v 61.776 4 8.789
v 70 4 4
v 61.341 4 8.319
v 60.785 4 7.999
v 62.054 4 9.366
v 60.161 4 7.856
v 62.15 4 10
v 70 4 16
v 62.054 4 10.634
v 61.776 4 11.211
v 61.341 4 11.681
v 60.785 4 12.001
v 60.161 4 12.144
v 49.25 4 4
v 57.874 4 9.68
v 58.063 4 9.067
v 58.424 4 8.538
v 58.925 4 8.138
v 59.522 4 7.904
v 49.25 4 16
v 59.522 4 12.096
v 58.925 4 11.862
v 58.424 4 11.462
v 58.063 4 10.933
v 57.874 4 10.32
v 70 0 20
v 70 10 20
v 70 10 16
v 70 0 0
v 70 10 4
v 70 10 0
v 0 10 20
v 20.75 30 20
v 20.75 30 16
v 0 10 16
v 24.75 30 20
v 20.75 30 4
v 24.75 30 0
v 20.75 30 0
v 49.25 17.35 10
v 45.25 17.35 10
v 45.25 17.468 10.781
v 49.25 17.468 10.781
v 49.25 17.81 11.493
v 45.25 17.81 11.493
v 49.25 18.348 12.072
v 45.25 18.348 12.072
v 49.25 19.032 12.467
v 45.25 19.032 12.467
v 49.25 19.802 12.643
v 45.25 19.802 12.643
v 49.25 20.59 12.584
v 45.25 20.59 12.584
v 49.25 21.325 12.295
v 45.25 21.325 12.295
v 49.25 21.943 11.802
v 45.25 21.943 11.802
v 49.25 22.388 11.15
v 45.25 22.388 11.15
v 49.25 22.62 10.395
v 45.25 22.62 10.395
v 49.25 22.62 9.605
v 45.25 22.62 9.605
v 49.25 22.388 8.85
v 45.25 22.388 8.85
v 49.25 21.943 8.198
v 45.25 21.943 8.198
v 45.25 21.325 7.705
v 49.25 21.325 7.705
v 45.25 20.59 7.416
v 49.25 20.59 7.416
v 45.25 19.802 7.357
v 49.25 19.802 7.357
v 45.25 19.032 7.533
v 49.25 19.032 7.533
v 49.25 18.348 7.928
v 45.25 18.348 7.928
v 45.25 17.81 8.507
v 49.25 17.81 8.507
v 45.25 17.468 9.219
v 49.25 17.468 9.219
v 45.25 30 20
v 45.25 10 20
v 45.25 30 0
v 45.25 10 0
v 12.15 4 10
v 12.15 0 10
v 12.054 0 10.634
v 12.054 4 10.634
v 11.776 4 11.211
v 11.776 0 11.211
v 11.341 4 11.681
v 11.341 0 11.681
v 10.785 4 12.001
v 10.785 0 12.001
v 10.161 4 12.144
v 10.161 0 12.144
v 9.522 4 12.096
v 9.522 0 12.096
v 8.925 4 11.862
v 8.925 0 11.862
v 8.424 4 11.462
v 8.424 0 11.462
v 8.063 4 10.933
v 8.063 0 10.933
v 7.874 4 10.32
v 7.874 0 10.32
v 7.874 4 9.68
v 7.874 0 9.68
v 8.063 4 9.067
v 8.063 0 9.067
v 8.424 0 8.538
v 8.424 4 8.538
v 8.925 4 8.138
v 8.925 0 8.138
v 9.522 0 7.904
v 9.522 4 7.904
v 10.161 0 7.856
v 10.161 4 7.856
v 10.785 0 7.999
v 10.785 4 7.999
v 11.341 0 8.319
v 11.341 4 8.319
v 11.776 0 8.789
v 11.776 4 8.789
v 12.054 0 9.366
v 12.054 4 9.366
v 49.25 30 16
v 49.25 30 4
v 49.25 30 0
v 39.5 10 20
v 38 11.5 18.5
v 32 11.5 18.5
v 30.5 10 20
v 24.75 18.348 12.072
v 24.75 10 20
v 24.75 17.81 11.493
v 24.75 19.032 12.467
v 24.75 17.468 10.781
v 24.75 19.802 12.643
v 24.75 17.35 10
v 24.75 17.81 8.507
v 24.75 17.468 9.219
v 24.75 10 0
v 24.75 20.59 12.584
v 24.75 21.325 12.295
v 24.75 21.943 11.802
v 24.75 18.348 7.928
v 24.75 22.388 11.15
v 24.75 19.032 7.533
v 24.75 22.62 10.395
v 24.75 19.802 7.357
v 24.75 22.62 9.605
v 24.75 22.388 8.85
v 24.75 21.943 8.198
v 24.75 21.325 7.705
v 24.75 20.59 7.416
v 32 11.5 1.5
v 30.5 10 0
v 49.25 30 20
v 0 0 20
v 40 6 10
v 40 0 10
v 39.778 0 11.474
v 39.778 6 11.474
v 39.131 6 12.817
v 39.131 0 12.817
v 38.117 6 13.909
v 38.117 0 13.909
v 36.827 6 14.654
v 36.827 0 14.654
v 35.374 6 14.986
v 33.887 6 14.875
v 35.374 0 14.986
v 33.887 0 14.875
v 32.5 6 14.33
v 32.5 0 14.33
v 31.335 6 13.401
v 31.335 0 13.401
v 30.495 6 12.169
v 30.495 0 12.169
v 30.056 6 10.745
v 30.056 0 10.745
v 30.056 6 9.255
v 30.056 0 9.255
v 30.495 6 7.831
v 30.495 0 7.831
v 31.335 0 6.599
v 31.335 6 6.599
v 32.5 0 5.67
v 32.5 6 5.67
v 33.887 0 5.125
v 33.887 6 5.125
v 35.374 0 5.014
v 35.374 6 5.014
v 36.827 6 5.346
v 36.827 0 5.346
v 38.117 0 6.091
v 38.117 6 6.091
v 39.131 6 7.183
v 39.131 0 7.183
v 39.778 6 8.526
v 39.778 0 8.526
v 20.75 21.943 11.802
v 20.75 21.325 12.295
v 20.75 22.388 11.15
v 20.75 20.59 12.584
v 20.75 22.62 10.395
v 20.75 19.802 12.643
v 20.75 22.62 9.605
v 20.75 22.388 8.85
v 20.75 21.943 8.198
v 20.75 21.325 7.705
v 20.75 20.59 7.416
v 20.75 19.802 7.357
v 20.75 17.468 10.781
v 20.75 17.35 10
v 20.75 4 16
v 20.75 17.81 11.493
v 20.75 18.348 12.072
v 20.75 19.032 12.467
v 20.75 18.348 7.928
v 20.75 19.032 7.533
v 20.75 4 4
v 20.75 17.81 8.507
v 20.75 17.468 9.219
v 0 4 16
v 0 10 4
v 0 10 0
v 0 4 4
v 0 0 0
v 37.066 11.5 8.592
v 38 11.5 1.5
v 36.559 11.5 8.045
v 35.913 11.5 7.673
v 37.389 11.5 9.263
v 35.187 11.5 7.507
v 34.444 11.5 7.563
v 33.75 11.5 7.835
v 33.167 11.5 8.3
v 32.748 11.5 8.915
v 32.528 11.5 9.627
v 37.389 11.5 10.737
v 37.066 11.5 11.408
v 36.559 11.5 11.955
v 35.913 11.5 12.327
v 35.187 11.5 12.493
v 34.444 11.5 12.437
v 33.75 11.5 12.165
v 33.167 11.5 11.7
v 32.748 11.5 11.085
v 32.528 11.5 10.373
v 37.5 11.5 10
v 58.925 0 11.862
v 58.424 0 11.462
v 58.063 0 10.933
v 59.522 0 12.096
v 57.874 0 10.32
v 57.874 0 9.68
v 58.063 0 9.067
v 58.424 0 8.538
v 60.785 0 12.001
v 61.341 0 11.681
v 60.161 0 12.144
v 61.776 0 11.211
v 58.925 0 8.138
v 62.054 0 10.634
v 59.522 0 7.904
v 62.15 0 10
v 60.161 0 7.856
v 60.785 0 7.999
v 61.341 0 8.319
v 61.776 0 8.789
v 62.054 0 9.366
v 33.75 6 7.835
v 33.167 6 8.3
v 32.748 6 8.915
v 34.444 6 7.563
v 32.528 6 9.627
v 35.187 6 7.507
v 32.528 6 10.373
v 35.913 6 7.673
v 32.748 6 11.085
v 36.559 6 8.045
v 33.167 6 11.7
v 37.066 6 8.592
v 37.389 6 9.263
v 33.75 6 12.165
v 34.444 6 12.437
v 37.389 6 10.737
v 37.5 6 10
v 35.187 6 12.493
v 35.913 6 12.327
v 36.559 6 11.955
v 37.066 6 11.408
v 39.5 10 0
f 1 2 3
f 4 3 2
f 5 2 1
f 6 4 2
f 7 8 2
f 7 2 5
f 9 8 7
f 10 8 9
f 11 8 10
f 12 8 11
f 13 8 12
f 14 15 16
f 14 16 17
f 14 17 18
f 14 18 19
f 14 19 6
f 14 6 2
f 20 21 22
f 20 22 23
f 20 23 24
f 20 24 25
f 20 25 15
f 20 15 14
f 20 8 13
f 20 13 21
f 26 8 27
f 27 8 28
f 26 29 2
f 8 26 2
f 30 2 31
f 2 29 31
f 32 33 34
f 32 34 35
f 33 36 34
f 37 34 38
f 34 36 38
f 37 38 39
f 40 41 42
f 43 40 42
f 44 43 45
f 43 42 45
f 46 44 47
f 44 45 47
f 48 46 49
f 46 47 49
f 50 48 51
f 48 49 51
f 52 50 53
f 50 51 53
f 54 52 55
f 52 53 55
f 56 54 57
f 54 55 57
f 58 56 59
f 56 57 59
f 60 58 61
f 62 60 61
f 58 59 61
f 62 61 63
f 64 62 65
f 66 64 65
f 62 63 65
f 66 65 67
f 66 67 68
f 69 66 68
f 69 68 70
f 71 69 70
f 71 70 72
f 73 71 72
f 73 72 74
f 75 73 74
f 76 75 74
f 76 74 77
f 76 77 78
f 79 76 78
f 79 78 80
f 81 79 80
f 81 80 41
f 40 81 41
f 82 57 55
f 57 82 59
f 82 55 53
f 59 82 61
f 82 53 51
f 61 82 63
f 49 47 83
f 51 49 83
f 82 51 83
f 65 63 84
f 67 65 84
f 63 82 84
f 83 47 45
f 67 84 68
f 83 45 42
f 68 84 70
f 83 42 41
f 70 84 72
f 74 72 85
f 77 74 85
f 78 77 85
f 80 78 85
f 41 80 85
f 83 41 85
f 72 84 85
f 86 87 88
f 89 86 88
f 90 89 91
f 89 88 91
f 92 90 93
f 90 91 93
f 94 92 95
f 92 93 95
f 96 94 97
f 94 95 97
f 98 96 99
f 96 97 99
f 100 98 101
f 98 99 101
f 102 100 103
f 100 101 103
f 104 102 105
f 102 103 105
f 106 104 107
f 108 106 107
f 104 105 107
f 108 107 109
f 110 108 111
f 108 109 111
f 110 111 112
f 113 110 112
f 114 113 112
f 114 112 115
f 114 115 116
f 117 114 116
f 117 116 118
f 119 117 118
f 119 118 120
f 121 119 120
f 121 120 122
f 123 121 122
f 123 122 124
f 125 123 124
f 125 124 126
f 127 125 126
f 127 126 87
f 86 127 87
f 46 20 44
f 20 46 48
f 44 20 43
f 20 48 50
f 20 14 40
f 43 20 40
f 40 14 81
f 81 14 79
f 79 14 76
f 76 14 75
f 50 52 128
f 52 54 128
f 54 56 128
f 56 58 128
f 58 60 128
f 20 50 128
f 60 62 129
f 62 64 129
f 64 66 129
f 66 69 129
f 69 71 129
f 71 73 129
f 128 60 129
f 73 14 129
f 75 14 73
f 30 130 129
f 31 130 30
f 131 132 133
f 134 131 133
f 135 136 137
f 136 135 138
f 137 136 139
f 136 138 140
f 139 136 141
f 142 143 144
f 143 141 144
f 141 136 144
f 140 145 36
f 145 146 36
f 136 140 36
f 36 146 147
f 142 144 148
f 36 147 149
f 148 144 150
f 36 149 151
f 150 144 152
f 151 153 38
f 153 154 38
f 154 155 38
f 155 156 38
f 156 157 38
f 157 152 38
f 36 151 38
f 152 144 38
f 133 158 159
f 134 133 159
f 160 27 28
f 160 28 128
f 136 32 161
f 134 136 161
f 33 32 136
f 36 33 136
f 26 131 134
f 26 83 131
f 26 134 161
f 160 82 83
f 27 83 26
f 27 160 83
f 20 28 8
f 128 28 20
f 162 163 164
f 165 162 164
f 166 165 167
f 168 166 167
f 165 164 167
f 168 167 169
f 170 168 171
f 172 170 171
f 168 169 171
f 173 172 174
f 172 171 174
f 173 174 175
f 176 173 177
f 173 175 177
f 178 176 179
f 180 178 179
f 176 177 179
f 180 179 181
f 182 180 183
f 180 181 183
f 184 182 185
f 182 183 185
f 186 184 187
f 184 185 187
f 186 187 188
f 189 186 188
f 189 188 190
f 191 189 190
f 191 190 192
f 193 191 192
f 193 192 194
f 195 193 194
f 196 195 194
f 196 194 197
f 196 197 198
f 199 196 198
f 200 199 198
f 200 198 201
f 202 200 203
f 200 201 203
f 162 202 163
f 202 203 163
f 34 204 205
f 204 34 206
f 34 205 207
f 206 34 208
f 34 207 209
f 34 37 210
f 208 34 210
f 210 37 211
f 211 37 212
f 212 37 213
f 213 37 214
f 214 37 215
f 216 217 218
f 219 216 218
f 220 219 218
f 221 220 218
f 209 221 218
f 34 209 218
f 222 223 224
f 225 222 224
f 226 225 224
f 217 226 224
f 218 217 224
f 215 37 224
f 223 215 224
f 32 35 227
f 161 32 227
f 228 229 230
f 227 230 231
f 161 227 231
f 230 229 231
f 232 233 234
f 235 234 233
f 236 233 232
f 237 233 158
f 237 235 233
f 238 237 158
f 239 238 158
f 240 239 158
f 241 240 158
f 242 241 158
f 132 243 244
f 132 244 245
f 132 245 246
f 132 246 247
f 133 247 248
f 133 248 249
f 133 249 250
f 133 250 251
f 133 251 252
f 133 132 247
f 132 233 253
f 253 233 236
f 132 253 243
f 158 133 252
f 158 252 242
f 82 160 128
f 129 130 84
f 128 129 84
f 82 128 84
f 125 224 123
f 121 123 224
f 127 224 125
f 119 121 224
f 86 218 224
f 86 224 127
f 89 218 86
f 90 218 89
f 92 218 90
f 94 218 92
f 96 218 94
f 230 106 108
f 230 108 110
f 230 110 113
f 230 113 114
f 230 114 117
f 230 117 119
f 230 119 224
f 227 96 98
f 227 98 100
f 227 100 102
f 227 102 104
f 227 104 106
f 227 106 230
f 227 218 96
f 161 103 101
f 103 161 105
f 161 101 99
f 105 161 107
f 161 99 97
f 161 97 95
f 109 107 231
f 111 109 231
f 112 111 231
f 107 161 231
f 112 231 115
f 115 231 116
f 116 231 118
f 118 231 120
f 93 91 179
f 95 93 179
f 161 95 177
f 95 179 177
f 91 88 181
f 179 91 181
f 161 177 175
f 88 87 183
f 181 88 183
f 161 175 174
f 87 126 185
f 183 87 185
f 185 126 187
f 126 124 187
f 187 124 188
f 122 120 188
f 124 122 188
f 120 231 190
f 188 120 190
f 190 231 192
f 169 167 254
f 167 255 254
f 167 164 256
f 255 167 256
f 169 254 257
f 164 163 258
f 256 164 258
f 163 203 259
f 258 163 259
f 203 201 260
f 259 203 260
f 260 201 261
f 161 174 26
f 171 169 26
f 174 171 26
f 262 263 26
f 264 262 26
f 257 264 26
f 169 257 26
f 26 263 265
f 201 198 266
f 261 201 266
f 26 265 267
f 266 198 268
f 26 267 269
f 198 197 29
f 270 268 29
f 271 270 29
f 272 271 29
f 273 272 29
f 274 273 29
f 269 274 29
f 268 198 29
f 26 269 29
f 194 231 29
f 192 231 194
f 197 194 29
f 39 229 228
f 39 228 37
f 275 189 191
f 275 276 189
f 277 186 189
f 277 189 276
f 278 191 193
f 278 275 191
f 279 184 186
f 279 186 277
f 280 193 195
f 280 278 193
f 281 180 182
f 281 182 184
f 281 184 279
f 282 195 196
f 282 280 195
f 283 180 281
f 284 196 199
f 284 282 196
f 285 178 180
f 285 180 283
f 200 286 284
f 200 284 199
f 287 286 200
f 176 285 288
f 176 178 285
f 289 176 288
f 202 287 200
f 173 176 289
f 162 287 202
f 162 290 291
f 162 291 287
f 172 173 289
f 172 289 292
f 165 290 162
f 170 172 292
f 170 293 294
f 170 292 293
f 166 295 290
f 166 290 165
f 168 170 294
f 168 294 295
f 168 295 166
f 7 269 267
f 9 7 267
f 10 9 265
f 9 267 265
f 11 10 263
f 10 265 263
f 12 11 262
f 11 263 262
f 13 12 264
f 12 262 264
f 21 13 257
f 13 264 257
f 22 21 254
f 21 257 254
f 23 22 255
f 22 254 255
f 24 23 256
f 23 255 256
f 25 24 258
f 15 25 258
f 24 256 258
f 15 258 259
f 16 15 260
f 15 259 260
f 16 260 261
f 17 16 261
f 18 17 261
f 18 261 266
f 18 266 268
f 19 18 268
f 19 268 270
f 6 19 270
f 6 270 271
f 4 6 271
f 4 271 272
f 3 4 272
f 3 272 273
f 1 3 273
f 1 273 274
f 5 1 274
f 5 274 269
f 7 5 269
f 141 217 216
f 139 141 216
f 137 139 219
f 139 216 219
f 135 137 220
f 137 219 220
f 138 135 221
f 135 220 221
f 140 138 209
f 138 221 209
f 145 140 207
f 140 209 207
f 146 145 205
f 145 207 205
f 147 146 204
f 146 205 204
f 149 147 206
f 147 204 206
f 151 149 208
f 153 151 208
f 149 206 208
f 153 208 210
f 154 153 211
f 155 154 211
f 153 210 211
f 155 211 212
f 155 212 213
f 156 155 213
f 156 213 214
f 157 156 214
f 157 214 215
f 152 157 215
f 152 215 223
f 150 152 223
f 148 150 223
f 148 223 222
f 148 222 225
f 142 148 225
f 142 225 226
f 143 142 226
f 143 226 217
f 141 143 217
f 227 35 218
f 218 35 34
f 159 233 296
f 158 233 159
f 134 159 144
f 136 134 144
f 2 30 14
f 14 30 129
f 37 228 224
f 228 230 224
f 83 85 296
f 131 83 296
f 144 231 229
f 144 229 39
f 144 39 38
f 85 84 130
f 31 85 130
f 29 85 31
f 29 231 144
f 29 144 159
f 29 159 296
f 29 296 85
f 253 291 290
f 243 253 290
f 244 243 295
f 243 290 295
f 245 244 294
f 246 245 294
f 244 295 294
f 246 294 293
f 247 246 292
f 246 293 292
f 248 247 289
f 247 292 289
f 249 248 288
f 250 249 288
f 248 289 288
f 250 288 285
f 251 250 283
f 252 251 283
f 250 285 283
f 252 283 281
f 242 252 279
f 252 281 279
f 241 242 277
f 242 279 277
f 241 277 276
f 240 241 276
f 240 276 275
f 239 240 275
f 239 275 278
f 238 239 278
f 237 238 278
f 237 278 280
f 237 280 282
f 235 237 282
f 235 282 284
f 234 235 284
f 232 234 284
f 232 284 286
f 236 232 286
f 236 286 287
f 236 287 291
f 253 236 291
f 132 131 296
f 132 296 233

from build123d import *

# Parameters (mm, degrees)
F1_DEPTH  = 20
F3_DEPTH  = 20
F4_W      = 20.75
F4_H      = 12
F5_DEPTH  = 6
F7_DEPTH  = 4
F9_DEPTH  = 4
F10_R     = 2.15
F10_R_2   = 2.5
F11_DEPTH = 30.001
F12_R     = 5
F13_DEPTH = 6
F14_SIZE  = 1.5
F15_R     = 2.65
F16_DEPTH = 49.251


with BuildPart() as f1:
    # F0 (on Top) → F1 (new body)
    with BuildSketch(Plane.XY):
        Polygon((0, 10), (0, 0), (70, 0), (70, 10), (49.25, 10), (49.25, 30), (45.25, 30), (45.25, 10), (24.75, 10), (24.75, 30), (20.75, 30), (20.75, 10), align=None)
    extrude(amount=F1_DEPTH)

    # F2 (on face) → F3 (join, through all)
    with BuildSketch(Plane.XY.offset(20)):
        Polygon((32, 11.5), (30.5, 10), (39.5, 10), (38, 11.5), align=None)
    extrude(amount=-F3_DEPTH)

    # F4 (on face) → F5 (cut)
    with BuildSketch(Plane(origin=(0, 10, 0), x_dir=(-1, 0, 0), z_dir=(0, 1, 0))):
        with Locations((-10.375, 10)):
            Rectangle(F4_W, F4_H)
        with Locations((-59.625, 10)):
            Rectangle(F4_W, F4_H)
    extrude(amount=-F5_DEPTH, mode=Mode.SUBTRACT)

    # F6 (on face) → F7 (join, through all)
    with BuildSketch(Plane(origin=(0, 0, 0), x_dir=(1, 0, 0), z_dir=(0, 0, -1))):
        Polygon((20.75, -10), (0, -10), (20.75, -30), align=None)
        Polygon((70, -10), (49.25, -10), (49.25, -30), align=None)
    extrude(amount=-F7_DEPTH)

    # F8 (on face) → F9 (join, through all)
    with BuildSketch(Plane.XY.offset(20)):
        Polygon((20.75, 30), (0, 10), (20.75, 10), align=None)
        Polygon((49.25, 10), (70, 10), (49.25, 30), align=None)
    extrude(amount=-F9_DEPTH)

    # F10 (on face) → F11 (cut, through all)
    with BuildSketch(Plane.XZ):
        with Locations((10, 10)):
            Circle(F10_R)
        with Locations((35, 10)):
            Circle(F10_R_2)
        with Locations((60, 10)):
            Circle(F10_R)
    extrude(amount=-F11_DEPTH, mode=Mode.SUBTRACT)

    # F12 (on face) → F13 (cut)
    with BuildSketch(Plane.XZ):
        with Locations((35, 10)):
            Circle(F12_R)
    extrude(amount=-F13_DEPTH, mode=Mode.SUBTRACT)

    # F14
    f14_edges = [f1.edges().sort_by_distance(p)[0] for p in [
        (35, 11.5, 20),
        (35, 11.5, 0),
    ]]
    chamfer(f14_edges, length=F14_SIZE)

    # F15 (on face) → F16 (cut, through all)
    with BuildSketch(Plane(origin=(20.75, 0, 0), x_dir=(0, -1, 0), z_dir=(-1, 0, 0))):
        with Locations((-20, 10)):
            Circle(F15_R)
    extrude(amount=-F16_DEPTH, mode=Mode.SUBTRACT)


solid = f1.part
